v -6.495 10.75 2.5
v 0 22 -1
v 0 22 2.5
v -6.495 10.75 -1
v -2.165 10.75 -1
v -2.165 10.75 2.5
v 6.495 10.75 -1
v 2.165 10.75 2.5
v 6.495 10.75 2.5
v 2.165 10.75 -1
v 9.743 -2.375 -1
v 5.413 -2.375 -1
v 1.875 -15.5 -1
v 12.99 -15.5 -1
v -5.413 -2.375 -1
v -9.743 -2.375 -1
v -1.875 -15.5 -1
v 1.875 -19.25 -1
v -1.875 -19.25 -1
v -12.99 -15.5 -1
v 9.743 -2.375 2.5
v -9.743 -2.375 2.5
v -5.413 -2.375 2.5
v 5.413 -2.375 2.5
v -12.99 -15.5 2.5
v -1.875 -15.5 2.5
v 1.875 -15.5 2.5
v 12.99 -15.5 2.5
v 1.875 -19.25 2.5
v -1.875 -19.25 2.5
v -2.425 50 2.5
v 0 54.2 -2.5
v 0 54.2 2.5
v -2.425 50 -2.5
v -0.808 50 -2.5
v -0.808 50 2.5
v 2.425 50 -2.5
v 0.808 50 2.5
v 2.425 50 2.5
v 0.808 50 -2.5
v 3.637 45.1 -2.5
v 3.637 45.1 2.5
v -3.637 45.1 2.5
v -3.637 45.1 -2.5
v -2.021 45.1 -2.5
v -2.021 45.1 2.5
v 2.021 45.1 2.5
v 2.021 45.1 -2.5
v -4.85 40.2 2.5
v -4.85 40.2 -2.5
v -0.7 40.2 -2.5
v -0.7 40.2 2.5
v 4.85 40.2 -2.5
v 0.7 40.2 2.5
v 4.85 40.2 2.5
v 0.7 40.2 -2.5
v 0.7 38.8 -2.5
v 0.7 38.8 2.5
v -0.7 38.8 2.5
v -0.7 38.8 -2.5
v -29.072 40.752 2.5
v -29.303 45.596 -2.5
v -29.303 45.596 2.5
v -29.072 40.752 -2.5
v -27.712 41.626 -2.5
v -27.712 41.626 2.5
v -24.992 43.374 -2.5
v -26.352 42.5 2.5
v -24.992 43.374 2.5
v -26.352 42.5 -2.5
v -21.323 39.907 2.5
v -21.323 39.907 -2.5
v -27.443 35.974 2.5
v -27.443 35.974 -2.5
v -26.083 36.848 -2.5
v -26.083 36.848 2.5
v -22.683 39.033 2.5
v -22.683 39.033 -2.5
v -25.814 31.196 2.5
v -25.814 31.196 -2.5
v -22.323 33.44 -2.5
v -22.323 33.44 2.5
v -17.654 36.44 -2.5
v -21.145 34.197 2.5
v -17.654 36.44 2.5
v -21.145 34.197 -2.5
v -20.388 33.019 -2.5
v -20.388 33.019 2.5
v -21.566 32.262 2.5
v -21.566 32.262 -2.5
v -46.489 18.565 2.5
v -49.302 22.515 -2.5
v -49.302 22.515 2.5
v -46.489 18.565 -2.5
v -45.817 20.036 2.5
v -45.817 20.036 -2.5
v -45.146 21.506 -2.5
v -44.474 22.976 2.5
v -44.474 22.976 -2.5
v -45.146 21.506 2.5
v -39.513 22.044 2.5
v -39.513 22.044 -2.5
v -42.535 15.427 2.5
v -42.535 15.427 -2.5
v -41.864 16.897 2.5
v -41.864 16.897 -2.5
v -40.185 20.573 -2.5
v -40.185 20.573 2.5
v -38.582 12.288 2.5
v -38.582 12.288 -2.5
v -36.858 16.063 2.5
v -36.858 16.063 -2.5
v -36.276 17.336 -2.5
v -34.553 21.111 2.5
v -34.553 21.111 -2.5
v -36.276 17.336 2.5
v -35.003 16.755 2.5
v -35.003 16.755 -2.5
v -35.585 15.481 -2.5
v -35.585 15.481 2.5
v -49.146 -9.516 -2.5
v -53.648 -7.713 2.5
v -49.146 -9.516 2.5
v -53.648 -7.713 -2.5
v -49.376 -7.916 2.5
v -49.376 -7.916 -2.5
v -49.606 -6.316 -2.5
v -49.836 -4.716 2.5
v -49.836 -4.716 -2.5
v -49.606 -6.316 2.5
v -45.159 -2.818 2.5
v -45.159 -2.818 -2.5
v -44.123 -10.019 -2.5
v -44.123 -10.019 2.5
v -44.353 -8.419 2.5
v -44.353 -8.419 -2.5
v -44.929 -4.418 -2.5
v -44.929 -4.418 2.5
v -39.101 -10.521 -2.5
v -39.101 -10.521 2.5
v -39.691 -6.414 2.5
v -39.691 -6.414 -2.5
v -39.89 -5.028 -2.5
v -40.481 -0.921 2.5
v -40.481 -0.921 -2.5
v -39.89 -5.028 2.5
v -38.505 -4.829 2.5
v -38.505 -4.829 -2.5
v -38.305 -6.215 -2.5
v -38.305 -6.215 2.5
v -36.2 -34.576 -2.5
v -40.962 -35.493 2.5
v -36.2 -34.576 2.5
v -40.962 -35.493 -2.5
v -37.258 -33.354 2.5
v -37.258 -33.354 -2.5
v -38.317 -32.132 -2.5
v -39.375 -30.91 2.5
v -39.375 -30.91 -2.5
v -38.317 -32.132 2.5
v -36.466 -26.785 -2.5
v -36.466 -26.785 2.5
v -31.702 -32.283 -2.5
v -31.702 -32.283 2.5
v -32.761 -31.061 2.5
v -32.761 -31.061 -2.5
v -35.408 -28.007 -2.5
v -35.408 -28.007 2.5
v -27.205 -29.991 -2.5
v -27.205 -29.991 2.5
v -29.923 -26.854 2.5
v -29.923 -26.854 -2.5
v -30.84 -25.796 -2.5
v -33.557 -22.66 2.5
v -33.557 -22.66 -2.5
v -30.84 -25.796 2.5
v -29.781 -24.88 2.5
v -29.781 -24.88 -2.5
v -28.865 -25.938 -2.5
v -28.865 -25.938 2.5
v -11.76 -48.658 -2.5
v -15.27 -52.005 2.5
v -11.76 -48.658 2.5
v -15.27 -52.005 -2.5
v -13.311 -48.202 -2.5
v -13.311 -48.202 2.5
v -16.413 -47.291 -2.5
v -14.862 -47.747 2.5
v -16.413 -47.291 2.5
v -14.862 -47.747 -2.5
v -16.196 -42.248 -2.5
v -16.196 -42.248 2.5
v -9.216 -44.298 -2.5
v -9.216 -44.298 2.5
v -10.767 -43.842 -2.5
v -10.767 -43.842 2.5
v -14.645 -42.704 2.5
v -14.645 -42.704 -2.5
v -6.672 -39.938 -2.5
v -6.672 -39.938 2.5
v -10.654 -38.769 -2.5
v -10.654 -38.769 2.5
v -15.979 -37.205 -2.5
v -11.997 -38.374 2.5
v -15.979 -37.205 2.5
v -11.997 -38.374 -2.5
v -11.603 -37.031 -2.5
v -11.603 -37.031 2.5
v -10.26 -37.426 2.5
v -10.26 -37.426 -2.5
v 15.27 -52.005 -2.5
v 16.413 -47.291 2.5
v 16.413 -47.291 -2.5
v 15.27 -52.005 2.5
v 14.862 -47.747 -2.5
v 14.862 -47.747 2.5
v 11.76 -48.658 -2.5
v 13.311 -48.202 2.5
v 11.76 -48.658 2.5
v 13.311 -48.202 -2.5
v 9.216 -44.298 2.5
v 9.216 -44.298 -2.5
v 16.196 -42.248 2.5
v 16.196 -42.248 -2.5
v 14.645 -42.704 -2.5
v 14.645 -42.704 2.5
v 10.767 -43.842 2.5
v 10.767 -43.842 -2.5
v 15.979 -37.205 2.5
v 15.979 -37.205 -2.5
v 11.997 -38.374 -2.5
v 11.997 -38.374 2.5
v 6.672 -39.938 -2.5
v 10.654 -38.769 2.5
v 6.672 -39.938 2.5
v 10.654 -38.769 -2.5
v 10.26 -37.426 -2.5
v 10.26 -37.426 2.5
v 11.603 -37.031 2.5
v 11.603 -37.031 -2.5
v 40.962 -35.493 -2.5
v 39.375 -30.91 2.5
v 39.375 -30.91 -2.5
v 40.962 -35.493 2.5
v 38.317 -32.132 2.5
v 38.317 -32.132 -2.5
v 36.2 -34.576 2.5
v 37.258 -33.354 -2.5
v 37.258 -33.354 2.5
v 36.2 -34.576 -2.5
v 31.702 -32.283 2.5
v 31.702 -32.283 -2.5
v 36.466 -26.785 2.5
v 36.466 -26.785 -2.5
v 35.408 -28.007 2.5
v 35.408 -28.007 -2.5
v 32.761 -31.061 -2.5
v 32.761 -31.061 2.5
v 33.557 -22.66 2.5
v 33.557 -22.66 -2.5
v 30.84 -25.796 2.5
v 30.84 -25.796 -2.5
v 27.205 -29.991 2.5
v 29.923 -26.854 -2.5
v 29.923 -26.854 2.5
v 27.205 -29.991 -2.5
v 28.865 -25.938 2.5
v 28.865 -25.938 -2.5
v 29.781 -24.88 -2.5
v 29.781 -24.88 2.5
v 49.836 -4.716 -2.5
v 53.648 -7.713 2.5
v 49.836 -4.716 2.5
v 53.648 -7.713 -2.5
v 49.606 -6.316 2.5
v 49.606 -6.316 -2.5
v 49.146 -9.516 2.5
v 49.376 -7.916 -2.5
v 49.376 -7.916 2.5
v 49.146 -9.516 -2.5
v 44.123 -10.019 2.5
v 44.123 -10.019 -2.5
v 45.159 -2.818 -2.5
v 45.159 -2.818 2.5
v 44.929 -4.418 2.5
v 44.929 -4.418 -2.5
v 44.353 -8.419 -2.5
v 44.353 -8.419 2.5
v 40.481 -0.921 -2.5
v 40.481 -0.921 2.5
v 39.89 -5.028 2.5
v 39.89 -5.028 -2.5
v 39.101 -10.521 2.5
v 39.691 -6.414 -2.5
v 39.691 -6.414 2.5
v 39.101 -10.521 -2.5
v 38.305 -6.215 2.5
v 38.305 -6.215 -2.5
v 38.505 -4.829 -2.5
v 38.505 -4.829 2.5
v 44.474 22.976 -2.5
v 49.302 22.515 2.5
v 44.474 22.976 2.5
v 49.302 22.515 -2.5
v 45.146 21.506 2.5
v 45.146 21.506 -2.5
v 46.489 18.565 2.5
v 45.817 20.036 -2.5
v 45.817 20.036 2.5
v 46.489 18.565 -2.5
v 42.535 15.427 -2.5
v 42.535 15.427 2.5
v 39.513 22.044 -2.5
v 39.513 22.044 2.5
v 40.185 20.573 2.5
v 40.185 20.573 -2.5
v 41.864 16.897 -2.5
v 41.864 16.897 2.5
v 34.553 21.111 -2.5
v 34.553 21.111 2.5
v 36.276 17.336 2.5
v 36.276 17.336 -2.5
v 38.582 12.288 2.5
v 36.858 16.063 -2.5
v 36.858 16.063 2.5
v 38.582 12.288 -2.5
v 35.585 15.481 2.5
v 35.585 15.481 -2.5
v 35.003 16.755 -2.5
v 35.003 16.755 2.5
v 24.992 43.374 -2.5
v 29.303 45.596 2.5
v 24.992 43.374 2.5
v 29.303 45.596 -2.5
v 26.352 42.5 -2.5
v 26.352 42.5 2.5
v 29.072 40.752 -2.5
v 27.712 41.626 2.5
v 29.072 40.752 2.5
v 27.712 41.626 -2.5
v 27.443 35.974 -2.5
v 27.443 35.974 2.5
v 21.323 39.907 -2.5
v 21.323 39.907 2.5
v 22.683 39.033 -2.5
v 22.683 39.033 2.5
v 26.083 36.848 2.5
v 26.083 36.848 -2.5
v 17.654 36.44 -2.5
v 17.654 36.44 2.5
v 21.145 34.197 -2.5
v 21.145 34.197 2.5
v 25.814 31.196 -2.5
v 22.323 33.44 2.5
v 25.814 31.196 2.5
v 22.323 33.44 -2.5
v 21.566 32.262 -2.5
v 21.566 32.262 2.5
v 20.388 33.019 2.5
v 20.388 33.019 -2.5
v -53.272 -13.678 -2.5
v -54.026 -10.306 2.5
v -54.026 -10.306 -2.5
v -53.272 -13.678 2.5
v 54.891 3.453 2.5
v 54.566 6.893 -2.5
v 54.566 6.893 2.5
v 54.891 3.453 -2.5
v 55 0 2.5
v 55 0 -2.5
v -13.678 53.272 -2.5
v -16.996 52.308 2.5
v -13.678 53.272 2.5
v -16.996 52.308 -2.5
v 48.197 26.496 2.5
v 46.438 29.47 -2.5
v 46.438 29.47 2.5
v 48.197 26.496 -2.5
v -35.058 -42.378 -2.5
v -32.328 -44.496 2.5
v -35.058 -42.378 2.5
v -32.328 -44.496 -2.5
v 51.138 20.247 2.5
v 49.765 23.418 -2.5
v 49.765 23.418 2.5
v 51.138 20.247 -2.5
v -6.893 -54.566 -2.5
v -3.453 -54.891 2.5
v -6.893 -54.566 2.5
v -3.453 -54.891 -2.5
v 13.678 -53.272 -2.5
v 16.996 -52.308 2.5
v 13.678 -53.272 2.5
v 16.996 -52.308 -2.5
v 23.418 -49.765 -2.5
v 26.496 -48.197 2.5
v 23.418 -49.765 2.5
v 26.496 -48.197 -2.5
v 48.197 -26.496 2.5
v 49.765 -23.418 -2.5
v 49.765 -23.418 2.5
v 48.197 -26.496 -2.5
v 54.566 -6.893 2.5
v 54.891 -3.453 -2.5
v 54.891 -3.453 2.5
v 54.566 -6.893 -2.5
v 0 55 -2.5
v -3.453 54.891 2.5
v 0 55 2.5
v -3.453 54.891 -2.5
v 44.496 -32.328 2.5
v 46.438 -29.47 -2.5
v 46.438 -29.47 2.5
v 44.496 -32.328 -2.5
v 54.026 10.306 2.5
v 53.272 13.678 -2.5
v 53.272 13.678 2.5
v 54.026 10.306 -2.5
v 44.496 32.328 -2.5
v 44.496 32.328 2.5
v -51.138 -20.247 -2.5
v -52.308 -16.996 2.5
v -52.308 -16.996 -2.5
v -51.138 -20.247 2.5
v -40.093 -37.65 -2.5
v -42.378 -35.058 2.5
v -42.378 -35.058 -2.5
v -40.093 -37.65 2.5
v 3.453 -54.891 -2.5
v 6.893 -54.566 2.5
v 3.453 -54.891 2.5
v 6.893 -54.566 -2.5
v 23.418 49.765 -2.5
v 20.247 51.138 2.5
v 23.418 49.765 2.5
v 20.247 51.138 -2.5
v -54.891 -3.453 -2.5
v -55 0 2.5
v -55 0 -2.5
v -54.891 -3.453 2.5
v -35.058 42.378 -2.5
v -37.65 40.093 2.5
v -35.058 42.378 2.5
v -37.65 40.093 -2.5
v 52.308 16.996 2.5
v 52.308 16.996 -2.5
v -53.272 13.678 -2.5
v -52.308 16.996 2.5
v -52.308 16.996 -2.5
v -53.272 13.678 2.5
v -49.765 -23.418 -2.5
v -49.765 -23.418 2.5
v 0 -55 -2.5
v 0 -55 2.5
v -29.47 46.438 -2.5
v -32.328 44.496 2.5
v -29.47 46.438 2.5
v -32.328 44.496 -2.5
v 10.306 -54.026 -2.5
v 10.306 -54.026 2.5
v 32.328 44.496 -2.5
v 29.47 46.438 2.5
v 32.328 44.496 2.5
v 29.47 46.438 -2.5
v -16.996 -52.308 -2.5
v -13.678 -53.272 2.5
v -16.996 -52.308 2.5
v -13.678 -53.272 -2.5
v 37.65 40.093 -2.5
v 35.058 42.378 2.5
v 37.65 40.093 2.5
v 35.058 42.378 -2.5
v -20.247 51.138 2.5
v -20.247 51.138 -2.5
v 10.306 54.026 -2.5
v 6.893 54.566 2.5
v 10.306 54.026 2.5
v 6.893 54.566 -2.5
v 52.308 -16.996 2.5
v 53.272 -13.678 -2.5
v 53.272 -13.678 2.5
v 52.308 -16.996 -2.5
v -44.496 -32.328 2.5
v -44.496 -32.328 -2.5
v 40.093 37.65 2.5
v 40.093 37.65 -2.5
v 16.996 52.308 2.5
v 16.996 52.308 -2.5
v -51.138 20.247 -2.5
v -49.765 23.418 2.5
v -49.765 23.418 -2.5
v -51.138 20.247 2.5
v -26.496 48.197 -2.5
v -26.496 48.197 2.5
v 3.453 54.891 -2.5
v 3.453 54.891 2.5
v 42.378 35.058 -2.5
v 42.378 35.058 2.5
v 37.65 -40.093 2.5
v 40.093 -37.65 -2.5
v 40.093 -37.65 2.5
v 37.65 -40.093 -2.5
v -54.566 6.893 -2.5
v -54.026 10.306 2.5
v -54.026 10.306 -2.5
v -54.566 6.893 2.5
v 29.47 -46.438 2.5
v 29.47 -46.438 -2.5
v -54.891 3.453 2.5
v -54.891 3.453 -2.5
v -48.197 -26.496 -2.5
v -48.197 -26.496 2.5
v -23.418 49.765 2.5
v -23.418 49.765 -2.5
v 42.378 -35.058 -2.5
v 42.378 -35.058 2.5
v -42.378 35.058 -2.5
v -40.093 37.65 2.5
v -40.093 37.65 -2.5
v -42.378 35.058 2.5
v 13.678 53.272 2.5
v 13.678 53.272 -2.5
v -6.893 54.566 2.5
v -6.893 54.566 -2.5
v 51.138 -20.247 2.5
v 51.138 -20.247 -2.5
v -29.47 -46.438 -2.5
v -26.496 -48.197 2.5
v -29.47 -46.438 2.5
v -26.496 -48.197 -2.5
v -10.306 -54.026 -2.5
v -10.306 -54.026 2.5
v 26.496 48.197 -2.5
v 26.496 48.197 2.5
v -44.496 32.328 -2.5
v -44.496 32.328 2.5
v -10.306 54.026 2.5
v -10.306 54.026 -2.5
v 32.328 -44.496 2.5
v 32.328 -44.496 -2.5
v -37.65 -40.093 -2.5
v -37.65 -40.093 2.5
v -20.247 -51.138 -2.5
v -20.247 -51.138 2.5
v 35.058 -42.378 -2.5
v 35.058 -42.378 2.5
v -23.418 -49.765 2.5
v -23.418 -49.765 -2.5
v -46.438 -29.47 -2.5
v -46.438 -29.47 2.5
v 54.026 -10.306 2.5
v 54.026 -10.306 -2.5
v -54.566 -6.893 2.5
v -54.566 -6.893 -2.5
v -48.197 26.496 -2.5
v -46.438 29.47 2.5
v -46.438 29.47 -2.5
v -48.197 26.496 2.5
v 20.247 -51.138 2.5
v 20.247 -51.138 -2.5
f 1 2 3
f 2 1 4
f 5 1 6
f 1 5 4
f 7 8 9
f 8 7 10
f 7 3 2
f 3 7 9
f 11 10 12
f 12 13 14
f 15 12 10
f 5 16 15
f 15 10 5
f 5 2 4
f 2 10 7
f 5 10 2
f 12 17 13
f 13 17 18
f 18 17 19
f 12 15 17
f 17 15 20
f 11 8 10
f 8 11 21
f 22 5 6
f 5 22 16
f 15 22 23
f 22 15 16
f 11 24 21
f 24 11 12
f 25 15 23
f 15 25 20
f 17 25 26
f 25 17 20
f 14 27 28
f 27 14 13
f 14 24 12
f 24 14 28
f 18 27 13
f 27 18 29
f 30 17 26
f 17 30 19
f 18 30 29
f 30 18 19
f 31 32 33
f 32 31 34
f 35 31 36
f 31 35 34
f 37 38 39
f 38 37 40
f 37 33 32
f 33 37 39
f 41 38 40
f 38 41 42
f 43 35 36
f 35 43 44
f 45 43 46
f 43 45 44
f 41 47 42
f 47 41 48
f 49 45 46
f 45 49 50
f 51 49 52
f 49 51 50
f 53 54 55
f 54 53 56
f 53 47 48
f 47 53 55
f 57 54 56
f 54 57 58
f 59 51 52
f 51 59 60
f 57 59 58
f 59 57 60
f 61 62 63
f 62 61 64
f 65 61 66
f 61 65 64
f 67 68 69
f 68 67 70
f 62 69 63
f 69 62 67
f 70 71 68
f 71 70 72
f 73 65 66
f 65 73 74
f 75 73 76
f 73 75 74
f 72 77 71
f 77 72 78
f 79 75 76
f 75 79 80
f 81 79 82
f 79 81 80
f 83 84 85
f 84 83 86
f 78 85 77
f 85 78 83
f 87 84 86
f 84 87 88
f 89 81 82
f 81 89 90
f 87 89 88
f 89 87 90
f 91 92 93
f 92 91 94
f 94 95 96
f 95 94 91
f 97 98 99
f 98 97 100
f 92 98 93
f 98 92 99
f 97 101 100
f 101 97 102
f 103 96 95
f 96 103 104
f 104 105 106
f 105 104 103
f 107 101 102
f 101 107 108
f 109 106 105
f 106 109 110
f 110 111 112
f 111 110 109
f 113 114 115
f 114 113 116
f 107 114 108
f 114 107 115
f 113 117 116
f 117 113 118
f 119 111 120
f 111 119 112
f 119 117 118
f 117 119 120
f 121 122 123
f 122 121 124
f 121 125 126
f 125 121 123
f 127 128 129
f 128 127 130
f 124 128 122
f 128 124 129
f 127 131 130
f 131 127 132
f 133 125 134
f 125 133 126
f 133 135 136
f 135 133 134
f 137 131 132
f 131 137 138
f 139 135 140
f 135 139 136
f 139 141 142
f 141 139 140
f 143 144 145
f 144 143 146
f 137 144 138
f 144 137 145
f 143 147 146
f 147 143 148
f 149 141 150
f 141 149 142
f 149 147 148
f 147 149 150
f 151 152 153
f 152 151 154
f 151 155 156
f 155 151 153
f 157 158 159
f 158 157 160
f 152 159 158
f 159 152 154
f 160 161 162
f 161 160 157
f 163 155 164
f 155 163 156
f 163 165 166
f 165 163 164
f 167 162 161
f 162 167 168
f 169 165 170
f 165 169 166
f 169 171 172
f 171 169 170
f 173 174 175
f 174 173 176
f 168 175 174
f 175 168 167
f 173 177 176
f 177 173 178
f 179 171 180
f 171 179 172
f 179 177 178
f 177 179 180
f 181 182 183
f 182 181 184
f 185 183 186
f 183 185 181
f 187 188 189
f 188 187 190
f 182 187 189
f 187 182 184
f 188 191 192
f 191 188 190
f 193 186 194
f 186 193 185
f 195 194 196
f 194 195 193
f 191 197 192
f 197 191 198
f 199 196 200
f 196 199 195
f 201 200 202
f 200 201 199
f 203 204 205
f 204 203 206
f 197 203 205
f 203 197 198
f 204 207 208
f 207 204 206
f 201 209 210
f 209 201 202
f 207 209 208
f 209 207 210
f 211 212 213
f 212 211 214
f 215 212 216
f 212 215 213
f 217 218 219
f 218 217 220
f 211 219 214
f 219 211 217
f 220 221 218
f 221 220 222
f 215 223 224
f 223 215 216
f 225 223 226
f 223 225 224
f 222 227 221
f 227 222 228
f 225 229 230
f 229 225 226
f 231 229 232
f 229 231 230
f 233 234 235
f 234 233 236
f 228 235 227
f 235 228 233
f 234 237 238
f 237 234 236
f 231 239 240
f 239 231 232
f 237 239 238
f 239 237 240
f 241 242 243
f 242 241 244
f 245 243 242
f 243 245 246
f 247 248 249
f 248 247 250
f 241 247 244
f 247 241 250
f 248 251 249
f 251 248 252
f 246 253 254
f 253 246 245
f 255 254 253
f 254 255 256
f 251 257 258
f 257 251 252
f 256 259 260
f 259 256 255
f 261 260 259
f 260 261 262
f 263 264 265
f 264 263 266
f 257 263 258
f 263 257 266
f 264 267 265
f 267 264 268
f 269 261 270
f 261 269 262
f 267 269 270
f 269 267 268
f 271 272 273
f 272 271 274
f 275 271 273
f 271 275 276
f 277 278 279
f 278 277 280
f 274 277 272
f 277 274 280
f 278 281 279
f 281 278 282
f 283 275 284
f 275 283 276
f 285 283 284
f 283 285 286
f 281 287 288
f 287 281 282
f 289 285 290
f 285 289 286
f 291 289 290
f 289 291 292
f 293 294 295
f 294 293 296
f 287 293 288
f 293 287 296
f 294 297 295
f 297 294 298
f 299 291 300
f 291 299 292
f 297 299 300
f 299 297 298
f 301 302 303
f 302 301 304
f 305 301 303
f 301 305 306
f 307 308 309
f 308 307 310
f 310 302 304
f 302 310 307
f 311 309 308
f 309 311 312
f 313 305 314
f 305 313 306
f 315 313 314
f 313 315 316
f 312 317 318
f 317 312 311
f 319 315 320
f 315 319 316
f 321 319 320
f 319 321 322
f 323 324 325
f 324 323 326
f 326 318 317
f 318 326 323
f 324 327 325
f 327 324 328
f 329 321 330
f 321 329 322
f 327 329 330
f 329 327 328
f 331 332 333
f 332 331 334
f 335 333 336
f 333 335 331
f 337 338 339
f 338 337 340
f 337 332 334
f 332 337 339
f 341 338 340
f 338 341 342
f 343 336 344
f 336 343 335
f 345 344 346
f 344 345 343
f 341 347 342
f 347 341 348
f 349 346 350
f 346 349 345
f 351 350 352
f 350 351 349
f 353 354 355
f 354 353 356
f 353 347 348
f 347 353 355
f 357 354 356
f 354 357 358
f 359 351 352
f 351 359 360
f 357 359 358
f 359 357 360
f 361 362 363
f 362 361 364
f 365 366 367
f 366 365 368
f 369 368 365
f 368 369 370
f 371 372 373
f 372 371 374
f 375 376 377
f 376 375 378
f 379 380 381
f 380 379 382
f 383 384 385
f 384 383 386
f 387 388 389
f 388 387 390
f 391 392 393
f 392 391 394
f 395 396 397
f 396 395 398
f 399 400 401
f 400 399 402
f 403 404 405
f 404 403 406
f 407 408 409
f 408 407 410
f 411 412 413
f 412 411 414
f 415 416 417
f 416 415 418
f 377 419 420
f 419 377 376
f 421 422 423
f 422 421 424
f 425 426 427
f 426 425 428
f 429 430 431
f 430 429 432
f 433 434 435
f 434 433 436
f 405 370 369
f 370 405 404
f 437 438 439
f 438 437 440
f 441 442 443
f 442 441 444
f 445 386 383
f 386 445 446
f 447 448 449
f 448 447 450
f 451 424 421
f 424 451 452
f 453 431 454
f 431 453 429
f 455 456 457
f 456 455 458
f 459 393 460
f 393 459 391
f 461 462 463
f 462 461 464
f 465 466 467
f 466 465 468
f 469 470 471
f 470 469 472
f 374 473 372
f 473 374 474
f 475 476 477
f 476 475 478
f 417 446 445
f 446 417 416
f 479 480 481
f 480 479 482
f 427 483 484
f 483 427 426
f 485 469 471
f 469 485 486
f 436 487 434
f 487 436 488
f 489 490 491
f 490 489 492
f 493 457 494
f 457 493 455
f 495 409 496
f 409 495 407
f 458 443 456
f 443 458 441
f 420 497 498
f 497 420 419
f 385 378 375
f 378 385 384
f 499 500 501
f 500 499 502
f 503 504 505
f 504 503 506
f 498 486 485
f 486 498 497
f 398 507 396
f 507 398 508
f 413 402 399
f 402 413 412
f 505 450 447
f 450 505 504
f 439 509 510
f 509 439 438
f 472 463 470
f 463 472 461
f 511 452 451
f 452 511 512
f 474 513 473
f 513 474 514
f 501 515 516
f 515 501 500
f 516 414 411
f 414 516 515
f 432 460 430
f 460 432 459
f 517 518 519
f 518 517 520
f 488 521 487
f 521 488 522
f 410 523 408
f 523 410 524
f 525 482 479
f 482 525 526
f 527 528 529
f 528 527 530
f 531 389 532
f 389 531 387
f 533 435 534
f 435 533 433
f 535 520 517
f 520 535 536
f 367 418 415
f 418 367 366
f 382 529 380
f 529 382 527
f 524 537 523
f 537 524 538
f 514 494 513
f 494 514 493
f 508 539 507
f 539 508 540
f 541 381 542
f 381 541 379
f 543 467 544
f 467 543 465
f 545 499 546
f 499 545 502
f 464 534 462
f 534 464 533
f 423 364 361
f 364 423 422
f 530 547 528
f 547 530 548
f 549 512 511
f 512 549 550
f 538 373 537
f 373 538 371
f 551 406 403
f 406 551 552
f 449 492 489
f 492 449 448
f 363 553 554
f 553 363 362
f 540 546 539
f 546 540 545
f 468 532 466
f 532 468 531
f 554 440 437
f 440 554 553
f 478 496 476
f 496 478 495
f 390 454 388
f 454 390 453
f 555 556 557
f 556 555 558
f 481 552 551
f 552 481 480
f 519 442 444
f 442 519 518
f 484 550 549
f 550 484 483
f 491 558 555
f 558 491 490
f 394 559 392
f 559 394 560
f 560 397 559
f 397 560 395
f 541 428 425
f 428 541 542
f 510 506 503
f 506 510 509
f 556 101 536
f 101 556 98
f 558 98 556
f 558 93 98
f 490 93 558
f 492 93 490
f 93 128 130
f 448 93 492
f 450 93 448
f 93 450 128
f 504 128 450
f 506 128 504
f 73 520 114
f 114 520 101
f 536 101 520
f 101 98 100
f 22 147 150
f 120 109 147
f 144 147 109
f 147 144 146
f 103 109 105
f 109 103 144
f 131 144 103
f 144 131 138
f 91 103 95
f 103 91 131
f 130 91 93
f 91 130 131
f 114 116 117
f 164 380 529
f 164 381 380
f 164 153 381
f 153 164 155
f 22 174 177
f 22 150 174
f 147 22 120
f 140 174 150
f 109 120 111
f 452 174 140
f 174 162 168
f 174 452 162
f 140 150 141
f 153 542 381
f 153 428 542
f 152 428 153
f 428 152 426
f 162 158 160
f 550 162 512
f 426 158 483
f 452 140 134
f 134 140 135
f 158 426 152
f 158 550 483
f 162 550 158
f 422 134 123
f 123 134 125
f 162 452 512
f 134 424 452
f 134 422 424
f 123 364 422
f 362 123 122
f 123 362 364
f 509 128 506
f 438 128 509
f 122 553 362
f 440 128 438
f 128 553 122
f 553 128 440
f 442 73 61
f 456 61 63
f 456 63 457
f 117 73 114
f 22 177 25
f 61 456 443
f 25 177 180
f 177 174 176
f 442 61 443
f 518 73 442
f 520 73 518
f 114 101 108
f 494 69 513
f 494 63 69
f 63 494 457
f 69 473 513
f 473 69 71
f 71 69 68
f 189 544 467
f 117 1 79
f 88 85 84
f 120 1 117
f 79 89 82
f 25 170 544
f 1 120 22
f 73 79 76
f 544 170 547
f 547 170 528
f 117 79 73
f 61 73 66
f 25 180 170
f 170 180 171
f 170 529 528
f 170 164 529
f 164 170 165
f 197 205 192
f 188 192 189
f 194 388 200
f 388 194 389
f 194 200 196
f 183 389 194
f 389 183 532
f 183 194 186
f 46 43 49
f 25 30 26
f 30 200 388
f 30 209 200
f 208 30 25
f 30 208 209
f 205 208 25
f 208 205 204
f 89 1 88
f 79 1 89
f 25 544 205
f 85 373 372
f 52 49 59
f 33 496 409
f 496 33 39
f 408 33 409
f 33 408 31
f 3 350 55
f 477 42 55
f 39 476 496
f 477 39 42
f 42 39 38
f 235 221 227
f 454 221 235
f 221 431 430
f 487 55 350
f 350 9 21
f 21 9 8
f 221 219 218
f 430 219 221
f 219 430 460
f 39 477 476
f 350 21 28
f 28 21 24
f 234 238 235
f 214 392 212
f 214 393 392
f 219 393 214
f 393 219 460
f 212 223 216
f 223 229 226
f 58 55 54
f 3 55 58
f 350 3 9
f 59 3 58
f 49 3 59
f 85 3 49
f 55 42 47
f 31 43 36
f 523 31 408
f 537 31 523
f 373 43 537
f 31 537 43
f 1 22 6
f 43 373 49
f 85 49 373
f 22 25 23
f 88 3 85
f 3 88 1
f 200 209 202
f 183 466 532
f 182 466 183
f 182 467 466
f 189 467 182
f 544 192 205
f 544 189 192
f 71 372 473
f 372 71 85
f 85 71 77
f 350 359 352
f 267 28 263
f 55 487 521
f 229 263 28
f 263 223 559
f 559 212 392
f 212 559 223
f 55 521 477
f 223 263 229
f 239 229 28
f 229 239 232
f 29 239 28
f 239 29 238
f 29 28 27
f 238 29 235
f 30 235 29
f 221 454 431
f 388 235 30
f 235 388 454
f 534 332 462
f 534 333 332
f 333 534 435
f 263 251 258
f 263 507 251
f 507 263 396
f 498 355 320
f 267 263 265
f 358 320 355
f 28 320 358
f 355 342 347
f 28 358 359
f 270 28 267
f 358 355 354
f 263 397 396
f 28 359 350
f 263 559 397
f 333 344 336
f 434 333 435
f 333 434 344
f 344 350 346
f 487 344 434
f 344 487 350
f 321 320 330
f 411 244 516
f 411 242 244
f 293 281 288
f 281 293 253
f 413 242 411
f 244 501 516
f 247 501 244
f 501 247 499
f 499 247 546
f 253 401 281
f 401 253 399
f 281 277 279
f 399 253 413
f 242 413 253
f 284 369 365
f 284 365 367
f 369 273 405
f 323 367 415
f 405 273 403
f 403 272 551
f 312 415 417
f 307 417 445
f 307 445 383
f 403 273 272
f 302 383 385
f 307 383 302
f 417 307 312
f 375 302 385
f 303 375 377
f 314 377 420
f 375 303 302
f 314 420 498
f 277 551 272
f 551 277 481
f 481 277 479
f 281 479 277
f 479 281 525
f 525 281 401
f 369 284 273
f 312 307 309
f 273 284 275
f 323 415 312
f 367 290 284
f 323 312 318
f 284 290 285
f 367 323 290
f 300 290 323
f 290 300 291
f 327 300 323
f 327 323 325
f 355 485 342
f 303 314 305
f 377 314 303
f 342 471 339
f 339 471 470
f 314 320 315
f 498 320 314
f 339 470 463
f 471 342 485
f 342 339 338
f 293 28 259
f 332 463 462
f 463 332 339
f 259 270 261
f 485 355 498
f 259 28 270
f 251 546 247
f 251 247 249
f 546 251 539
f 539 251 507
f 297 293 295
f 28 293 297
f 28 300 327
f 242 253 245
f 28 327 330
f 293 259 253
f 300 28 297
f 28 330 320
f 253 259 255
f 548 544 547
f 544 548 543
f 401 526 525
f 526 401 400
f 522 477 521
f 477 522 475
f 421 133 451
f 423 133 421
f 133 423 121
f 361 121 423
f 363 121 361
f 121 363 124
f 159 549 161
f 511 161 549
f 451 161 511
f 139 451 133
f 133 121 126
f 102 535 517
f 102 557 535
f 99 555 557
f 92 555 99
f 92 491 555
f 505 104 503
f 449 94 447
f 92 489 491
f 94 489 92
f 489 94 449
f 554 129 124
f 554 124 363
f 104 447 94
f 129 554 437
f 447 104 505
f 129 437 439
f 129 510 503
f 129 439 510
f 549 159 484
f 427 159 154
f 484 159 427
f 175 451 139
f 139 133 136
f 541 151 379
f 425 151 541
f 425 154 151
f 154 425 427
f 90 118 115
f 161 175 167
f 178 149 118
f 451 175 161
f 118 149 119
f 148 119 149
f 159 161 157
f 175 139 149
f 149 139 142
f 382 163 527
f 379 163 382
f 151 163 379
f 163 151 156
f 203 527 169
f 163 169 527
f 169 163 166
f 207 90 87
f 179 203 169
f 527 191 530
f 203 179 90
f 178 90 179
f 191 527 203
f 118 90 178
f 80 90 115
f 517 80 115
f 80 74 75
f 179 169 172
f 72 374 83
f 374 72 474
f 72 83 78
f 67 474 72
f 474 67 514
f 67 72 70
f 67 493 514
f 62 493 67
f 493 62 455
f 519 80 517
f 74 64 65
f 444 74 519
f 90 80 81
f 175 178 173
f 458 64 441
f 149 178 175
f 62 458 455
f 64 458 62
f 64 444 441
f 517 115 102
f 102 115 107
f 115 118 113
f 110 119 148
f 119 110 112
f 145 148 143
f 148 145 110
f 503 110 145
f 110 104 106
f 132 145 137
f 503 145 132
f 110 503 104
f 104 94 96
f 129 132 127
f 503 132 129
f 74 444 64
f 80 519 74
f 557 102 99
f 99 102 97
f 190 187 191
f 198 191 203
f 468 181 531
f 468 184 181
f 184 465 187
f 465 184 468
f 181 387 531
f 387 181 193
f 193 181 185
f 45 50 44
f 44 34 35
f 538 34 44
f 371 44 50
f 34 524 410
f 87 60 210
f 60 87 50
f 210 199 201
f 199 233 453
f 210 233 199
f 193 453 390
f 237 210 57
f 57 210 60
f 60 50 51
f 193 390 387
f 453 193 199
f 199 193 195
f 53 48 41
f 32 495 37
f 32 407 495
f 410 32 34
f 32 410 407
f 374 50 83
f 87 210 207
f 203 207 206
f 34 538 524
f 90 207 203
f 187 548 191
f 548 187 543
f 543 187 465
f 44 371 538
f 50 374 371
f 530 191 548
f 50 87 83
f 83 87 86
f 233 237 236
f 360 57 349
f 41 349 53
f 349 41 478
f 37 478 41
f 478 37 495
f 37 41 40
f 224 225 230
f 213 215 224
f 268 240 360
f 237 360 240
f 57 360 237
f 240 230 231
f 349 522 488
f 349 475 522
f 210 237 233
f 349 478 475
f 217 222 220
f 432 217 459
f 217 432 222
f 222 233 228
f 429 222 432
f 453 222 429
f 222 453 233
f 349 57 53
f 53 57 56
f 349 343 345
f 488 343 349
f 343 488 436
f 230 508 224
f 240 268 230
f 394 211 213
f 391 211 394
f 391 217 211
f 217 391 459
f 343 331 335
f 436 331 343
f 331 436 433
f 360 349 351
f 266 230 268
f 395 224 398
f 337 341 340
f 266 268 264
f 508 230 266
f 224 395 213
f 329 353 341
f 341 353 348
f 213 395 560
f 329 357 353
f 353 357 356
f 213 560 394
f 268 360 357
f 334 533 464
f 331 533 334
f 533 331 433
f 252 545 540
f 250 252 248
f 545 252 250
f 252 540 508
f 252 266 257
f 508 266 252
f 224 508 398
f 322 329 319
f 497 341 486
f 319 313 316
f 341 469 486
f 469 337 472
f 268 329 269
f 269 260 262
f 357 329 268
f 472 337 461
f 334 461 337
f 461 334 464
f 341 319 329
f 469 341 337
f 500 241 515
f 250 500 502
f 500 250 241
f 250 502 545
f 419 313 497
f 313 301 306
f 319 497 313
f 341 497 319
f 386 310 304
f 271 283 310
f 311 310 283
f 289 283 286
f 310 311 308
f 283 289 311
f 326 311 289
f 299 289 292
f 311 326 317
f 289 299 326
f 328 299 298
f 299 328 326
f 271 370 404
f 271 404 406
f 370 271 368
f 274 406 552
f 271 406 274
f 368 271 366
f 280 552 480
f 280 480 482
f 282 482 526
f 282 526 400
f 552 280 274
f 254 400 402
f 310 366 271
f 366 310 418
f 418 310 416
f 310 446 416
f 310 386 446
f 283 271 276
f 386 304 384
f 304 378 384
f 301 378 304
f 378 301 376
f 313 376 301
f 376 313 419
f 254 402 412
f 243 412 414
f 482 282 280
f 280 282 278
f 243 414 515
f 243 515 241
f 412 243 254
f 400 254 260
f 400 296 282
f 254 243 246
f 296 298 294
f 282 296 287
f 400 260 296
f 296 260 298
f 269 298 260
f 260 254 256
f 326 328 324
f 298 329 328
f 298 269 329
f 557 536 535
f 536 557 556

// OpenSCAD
// file: ../../../shapes/religion/christianity/crucifixion-cross/crucifixion-cross.scad
crucifixionCcross();

module crucifixionCcross(height=2)
{
    beamWidth = 3;
    
    union()
    {
        // vertical beam
        xTranslate = -beamWidth / 2.0;
        yLength = 13;
        color("brown")
        translate([xTranslate, 0, 0])
        cube([3, yLength, height]);

        // horizontal beam        
        yTranslate = yLength * 0.5;
        xLength = yLength * 0.75;
        xTranslateHBeam = -xLength / 2.0;
        
        color("green")
        translate([xTranslateHBeam, yTranslate, 0])
        cube([xLength, 3, height]);        
    }        
}
// file: ../../../shapes/trees/christmas/christmas-tree.scad
christmasTree();

module christmasTree(height = 3)
{
    union()
    {
        // top triangle
        translate([0, 30, 0])
        triangle(10, height);
        
        // middle triangle
        translate([0, 15, 0])
        color("green")
        triangle(15, height);
        
        // bottom triangle
        triangle(20, height);
        
        // trunk
        color("brown")
        translate([-2.5, -15, 0])
        cube([5, 5, height]);
    }
}

module triangle(size, height)
{
    rotate([0, 0, 90])
    cylinder(r=size, 
             $fn=3,
             h=height);
}
// file: ../../../shapes/throwie-cutout/throwie-cutout.scad
throwieCutout();

/**
 * this modeled after a 5mm LED
 */
module throwieCutout(height=2)
{
    ledWidth = 10;
    ledHeight = 13;
    
    union()
    {
        // LED bottom cutout
        ledBottomCutoutLengthX = ledWidth + 1 + 1; 
        xTranslate = -ledBottomCutoutLengthX / 2.0;
        yLength = 13;
        color("brown")
        translate([xTranslate, 0, 0])
        cube([ledBottomCutoutLengthX, 2, height]);

        // LED middle coutout        
        yTranslate = 1.5;
        xLength = ledWidth + 1;
        xTranslateHBeam = -xLength / 2.0; 
        color("green")
        translate([xTranslateHBeam, yTranslate, 0])
        cube([xLength, 7, height]);
        
        // LED curved top
        curvedTopTranslateY = (2 + 7);
        curvedTopRadius = (ledWidth / 2.0) + 0.5;
        color("red")
        translate([0, curvedTopTranslateY, 0])
        cylinder (h = height, r=curvedTopRadius, $fn=100);
        
        // battery
        batteryRadius = 10;
        translate([0, -11, 0])
        cylinder (h = height, r=batteryRadius, $fn=100);
    }        
}
// file: ../../../shapes/spurs/spurs-a.scad
// Module names are of the form poly_<inkscape-path-id>().  As a result,
// you can associate a polygon in this OpenSCAD program with the corresponding
// SVG element in the Inkscape document by looking for the XML element with
// the attribute id="inkscape-path-id".

// fudge value is used to ensure that subtracted solids are a tad taller
// in the z dimension than the polygon being subtracted from.  This helps
// keep the resulting .stl file manifold.
fudge = 0.1;

module spurs(h)
{
  scale([25.4/90, -25.4/90, 1]) union()
  {
    linear_extrude(height=h)
      polygon([[13.500000,-56.000000],[29.500000,-55.000000],[54.500000,-55.000000],[58.503750,-55.048750],[60.522969,-55.341719],[62.290000,-56.020000],[64.325156,-57.853594],[66.241250,-60.541250],[69.240000,-66.000000],[80.500000,-87.000000],[106.280000,-135.000000],[118.870000,-159.000000],[122.780000,-198.000000],[124.023594,-204.882813],[125.843750,-209.652500],[128.457031,-214.095937],[132.080000,-220.000000],[148.490000,-248.000000],[153.376719,-256.487656],[155.041895,-259.143652],[156.518750,-260.956250],[158.055137,-262.086816],[159.898906,-262.696719],[165.500000,-263.000000],[214.500000,-263.000000],[214.500000,-213.000000],[213.360000,-196.000000],[213.360000,-154.000000],[213.495000,-150.462500],[213.360000,-147.000000],[196.920000,-117.000000],[156.350000,-45.000000],[125.920000,9.000000],[120.671250,18.592500],[117.385469,23.577187],[115.794199,25.366055],[114.320000,26.400000],[112.797344,26.797500],[110.981250,26.970000],[107.500000,27.000000],[79.500000,27.000000],[65.500000,28.000000],[31.500000,28.000000],[27.943750,28.030000],[24.500000,28.600000],[22.684180,29.597539],[20.548438,31.277812],[15.792500,35.922500],[7.670000,45.000000],[-36.500000,94.040000],[-25.500000,94.040000],[-15.500000,95.000000],[1.500000,95.000000],[22.500000,96.000000],[2.500000,114.080000],[-38.500000,149.000000],[-23.230000,165.000000],[-3.230000,188.000000],[14.500000,210.000000],[-66.500000,189.000000],[-91.500000,263.000000],[-92.970664,261.624141],[-94.426562,259.592500],[-97.197500,254.302500],[-101.500000,244.000000],[-121.500000,198.000000],[-200.500000,222.000000],[-174.840000,182.000000],[-154.500000,151.000000],[-187.500000,128.020000],[-214.500000,108.000000],[-166.500000,103.830000],[-135.500000,101.000000],[-137.410000,77.000000],[-139.590000,41.000000],[-140.500000,31.000000],[-138.108496,32.343340],[-135.722969,34.055469],[-131.038750,38.223750],[-122.500000,47.000000],[-111.500000,57.040000],[-94.500000,74.000000],[-77.500000,27.000000],[-107.500000,26.000000],[-117.196250,25.451250],[-122.812656,24.814531],[-126.090000,23.980000],[-127.513906,22.488438],[-128.773750,20.335000],[-130.730000,16.000000],[-138.200000,-1.000000],[-140.195000,-5.868750],[-140.649688,-8.406719],[-140.330000,-11.000000],[-134.780000,-21.000000],[-120.780000,-45.000000],[-74.650000,-124.000000],[-55.110000,-158.000000],[-46.570000,-206.000000],[-30.280000,-238.000000],[-21.920000,-254.000000],[-19.818750,-257.793750],[-18.535156,-259.646094],[-17.110000,-260.980000],[-15.251406,-261.684844],[-12.943750,-261.983750],[-8.500000,-261.990000],[5.500000,-261.000000],[19.500000,-261.000000],[31.500000,-260.040000],[43.500000,-260.040000],[43.500000,-217.000000],[44.500000,-200.000000],[44.500000,-162.000000],[43.800000,-154.000000],[28.100000,-127.000000],[-14.500000,-56.000000],[13.500000,-56.000000]]);
  }
}

spurs(5);
// file: ../../coin.scad
use <../shapes/spurs/spurs-a.scad>
use <../shapes/throwie-cutout/throwie-cutout.scad>
use <../shapes/trees/christmas/christmas-tree.scad>
use <../shapes/religion/christianity/crucifixion-cross/crucifixion-cross.scad>

module coin(innerIcon,
            innerIconXyScale,
            innerIconOffsetY,
            outerIcon,
            outerIconCount,            
            outerIconXyScale,
            radius,
            height)
{
    difference()
    {
        // main disk
        cylinder (h = height, r=radius, center = true, $fn=100);
        
        // inner icon
        translate([0, innerIconOffsetY, -1])
        scale([innerIconXyScale, innerIconXyScale, 6.5])
        coinIcon(innerIcon, height);
        
        // outer icons
        for ( i = [0 : outerIconCount] )
        {
            rotate( i * 360 / (outerIconCount+1), [0, 0, 1])
            translate([0, 43, -5])
            scale([outerIconXyScale, outerIconXyScale, 3.0])
            coinIcon(outerIcon, height);
        }
    }    
}

module coinIcon(iconName, height)
{
    if(iconName == "Cross")
    {
        crucifixionCcross(height);
    }
    else if(iconName == "Throwie")
    {
        throwieCutout(height=height);
    }
    else
    {
        // defalut
        christmasTree(height);
    }    
}
// main file
use <../../coin.scad>;

coin(innerIcon = "Tree",
     innerIconXyScale = 0.75,
     innerIconOffsetY = -8,
     outerIcon = "Tree",
     outerIconCount = 10,            
     outerIconXyScale = 0.28,
     radius = 55,
     height=5);
